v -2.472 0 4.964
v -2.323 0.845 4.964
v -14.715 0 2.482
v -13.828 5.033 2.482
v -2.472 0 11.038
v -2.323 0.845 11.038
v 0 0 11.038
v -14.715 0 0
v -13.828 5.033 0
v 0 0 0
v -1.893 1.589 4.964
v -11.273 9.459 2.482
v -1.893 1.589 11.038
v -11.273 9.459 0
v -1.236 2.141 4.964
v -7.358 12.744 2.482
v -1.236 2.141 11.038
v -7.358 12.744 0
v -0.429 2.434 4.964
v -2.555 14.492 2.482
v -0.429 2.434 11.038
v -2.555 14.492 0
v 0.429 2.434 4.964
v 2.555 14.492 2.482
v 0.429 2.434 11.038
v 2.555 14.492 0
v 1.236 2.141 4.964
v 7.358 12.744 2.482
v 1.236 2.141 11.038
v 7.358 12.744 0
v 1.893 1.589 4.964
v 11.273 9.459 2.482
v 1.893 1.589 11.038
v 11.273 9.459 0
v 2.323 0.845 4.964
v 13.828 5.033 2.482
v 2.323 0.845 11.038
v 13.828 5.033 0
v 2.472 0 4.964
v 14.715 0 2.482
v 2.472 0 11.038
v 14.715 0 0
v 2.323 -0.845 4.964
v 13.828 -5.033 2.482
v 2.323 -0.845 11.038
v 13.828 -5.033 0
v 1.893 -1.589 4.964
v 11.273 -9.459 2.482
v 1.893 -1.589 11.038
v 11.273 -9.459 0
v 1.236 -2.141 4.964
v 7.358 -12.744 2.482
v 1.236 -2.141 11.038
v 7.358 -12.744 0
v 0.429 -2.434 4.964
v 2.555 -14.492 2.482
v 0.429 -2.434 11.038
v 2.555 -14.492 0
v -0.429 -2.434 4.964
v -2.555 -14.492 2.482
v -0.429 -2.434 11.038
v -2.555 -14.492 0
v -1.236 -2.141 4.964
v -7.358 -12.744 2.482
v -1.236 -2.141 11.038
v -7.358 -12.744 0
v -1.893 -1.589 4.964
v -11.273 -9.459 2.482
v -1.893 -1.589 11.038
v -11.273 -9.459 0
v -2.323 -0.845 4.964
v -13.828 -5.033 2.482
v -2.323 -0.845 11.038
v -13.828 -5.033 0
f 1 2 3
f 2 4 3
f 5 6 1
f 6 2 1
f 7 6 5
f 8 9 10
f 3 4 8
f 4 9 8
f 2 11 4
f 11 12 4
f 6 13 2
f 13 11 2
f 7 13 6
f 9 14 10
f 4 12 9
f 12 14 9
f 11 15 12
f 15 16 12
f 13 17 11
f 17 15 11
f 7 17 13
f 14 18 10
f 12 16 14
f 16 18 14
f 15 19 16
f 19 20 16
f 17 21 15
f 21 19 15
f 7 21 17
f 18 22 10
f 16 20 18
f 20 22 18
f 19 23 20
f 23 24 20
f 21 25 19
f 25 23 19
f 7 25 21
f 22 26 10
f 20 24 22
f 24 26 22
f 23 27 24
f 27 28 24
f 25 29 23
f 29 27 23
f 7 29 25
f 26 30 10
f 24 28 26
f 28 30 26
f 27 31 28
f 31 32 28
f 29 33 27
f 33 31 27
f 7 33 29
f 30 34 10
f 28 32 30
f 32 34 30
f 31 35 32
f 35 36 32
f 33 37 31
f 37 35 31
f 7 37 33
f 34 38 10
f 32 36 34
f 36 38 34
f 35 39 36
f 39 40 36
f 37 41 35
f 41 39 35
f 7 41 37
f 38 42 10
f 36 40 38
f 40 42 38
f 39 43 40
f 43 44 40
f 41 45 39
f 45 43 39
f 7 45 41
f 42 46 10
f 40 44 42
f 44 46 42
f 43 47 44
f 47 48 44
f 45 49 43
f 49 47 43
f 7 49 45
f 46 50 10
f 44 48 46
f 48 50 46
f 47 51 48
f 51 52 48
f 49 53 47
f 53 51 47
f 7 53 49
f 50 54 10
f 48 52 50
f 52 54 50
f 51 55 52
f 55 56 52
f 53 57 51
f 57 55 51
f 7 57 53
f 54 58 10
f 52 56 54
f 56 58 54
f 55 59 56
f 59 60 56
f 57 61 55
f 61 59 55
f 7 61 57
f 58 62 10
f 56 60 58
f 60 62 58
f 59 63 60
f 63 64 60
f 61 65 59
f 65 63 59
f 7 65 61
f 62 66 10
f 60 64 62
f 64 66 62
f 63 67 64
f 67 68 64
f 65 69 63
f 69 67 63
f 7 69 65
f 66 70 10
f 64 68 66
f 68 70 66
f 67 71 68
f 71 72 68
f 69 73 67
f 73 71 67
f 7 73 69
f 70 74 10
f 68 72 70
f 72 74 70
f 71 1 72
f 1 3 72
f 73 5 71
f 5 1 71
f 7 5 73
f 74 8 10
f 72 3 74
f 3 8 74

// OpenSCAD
// oyl_disc_pad.scad — disc pad with center stud (part04, exact recreation)
// Recovered from mesh: 18-sided polygon (original is faceted; raise $fn to smooth,
// but $fn=18 with these vertex radii reproduces the original mesh exactly).
// Local frame: axis = +Z, bottom face at z=0, axis at origin.

fn      = 18;       // 18 matches the original faceting
r_disc  = 14.7155;  // disc vertex radius
h_disc  = 2.4820;   // disc rim height
z_cone  = 4.9640;   // z where cone meets stud
r_stud  = 2.4718;   // stud vertex radius
h_total = 11.0380;  // total height

module disc_pad() {
    rotate_extrude($fn = fn)
        polygon([
            [0, 0],
            [r_disc, 0],
            [r_disc, h_disc],
            [r_stud, z_cone],
            [r_stud, h_total],
            [0, h_total]
        ]);
}

disc_pad();
